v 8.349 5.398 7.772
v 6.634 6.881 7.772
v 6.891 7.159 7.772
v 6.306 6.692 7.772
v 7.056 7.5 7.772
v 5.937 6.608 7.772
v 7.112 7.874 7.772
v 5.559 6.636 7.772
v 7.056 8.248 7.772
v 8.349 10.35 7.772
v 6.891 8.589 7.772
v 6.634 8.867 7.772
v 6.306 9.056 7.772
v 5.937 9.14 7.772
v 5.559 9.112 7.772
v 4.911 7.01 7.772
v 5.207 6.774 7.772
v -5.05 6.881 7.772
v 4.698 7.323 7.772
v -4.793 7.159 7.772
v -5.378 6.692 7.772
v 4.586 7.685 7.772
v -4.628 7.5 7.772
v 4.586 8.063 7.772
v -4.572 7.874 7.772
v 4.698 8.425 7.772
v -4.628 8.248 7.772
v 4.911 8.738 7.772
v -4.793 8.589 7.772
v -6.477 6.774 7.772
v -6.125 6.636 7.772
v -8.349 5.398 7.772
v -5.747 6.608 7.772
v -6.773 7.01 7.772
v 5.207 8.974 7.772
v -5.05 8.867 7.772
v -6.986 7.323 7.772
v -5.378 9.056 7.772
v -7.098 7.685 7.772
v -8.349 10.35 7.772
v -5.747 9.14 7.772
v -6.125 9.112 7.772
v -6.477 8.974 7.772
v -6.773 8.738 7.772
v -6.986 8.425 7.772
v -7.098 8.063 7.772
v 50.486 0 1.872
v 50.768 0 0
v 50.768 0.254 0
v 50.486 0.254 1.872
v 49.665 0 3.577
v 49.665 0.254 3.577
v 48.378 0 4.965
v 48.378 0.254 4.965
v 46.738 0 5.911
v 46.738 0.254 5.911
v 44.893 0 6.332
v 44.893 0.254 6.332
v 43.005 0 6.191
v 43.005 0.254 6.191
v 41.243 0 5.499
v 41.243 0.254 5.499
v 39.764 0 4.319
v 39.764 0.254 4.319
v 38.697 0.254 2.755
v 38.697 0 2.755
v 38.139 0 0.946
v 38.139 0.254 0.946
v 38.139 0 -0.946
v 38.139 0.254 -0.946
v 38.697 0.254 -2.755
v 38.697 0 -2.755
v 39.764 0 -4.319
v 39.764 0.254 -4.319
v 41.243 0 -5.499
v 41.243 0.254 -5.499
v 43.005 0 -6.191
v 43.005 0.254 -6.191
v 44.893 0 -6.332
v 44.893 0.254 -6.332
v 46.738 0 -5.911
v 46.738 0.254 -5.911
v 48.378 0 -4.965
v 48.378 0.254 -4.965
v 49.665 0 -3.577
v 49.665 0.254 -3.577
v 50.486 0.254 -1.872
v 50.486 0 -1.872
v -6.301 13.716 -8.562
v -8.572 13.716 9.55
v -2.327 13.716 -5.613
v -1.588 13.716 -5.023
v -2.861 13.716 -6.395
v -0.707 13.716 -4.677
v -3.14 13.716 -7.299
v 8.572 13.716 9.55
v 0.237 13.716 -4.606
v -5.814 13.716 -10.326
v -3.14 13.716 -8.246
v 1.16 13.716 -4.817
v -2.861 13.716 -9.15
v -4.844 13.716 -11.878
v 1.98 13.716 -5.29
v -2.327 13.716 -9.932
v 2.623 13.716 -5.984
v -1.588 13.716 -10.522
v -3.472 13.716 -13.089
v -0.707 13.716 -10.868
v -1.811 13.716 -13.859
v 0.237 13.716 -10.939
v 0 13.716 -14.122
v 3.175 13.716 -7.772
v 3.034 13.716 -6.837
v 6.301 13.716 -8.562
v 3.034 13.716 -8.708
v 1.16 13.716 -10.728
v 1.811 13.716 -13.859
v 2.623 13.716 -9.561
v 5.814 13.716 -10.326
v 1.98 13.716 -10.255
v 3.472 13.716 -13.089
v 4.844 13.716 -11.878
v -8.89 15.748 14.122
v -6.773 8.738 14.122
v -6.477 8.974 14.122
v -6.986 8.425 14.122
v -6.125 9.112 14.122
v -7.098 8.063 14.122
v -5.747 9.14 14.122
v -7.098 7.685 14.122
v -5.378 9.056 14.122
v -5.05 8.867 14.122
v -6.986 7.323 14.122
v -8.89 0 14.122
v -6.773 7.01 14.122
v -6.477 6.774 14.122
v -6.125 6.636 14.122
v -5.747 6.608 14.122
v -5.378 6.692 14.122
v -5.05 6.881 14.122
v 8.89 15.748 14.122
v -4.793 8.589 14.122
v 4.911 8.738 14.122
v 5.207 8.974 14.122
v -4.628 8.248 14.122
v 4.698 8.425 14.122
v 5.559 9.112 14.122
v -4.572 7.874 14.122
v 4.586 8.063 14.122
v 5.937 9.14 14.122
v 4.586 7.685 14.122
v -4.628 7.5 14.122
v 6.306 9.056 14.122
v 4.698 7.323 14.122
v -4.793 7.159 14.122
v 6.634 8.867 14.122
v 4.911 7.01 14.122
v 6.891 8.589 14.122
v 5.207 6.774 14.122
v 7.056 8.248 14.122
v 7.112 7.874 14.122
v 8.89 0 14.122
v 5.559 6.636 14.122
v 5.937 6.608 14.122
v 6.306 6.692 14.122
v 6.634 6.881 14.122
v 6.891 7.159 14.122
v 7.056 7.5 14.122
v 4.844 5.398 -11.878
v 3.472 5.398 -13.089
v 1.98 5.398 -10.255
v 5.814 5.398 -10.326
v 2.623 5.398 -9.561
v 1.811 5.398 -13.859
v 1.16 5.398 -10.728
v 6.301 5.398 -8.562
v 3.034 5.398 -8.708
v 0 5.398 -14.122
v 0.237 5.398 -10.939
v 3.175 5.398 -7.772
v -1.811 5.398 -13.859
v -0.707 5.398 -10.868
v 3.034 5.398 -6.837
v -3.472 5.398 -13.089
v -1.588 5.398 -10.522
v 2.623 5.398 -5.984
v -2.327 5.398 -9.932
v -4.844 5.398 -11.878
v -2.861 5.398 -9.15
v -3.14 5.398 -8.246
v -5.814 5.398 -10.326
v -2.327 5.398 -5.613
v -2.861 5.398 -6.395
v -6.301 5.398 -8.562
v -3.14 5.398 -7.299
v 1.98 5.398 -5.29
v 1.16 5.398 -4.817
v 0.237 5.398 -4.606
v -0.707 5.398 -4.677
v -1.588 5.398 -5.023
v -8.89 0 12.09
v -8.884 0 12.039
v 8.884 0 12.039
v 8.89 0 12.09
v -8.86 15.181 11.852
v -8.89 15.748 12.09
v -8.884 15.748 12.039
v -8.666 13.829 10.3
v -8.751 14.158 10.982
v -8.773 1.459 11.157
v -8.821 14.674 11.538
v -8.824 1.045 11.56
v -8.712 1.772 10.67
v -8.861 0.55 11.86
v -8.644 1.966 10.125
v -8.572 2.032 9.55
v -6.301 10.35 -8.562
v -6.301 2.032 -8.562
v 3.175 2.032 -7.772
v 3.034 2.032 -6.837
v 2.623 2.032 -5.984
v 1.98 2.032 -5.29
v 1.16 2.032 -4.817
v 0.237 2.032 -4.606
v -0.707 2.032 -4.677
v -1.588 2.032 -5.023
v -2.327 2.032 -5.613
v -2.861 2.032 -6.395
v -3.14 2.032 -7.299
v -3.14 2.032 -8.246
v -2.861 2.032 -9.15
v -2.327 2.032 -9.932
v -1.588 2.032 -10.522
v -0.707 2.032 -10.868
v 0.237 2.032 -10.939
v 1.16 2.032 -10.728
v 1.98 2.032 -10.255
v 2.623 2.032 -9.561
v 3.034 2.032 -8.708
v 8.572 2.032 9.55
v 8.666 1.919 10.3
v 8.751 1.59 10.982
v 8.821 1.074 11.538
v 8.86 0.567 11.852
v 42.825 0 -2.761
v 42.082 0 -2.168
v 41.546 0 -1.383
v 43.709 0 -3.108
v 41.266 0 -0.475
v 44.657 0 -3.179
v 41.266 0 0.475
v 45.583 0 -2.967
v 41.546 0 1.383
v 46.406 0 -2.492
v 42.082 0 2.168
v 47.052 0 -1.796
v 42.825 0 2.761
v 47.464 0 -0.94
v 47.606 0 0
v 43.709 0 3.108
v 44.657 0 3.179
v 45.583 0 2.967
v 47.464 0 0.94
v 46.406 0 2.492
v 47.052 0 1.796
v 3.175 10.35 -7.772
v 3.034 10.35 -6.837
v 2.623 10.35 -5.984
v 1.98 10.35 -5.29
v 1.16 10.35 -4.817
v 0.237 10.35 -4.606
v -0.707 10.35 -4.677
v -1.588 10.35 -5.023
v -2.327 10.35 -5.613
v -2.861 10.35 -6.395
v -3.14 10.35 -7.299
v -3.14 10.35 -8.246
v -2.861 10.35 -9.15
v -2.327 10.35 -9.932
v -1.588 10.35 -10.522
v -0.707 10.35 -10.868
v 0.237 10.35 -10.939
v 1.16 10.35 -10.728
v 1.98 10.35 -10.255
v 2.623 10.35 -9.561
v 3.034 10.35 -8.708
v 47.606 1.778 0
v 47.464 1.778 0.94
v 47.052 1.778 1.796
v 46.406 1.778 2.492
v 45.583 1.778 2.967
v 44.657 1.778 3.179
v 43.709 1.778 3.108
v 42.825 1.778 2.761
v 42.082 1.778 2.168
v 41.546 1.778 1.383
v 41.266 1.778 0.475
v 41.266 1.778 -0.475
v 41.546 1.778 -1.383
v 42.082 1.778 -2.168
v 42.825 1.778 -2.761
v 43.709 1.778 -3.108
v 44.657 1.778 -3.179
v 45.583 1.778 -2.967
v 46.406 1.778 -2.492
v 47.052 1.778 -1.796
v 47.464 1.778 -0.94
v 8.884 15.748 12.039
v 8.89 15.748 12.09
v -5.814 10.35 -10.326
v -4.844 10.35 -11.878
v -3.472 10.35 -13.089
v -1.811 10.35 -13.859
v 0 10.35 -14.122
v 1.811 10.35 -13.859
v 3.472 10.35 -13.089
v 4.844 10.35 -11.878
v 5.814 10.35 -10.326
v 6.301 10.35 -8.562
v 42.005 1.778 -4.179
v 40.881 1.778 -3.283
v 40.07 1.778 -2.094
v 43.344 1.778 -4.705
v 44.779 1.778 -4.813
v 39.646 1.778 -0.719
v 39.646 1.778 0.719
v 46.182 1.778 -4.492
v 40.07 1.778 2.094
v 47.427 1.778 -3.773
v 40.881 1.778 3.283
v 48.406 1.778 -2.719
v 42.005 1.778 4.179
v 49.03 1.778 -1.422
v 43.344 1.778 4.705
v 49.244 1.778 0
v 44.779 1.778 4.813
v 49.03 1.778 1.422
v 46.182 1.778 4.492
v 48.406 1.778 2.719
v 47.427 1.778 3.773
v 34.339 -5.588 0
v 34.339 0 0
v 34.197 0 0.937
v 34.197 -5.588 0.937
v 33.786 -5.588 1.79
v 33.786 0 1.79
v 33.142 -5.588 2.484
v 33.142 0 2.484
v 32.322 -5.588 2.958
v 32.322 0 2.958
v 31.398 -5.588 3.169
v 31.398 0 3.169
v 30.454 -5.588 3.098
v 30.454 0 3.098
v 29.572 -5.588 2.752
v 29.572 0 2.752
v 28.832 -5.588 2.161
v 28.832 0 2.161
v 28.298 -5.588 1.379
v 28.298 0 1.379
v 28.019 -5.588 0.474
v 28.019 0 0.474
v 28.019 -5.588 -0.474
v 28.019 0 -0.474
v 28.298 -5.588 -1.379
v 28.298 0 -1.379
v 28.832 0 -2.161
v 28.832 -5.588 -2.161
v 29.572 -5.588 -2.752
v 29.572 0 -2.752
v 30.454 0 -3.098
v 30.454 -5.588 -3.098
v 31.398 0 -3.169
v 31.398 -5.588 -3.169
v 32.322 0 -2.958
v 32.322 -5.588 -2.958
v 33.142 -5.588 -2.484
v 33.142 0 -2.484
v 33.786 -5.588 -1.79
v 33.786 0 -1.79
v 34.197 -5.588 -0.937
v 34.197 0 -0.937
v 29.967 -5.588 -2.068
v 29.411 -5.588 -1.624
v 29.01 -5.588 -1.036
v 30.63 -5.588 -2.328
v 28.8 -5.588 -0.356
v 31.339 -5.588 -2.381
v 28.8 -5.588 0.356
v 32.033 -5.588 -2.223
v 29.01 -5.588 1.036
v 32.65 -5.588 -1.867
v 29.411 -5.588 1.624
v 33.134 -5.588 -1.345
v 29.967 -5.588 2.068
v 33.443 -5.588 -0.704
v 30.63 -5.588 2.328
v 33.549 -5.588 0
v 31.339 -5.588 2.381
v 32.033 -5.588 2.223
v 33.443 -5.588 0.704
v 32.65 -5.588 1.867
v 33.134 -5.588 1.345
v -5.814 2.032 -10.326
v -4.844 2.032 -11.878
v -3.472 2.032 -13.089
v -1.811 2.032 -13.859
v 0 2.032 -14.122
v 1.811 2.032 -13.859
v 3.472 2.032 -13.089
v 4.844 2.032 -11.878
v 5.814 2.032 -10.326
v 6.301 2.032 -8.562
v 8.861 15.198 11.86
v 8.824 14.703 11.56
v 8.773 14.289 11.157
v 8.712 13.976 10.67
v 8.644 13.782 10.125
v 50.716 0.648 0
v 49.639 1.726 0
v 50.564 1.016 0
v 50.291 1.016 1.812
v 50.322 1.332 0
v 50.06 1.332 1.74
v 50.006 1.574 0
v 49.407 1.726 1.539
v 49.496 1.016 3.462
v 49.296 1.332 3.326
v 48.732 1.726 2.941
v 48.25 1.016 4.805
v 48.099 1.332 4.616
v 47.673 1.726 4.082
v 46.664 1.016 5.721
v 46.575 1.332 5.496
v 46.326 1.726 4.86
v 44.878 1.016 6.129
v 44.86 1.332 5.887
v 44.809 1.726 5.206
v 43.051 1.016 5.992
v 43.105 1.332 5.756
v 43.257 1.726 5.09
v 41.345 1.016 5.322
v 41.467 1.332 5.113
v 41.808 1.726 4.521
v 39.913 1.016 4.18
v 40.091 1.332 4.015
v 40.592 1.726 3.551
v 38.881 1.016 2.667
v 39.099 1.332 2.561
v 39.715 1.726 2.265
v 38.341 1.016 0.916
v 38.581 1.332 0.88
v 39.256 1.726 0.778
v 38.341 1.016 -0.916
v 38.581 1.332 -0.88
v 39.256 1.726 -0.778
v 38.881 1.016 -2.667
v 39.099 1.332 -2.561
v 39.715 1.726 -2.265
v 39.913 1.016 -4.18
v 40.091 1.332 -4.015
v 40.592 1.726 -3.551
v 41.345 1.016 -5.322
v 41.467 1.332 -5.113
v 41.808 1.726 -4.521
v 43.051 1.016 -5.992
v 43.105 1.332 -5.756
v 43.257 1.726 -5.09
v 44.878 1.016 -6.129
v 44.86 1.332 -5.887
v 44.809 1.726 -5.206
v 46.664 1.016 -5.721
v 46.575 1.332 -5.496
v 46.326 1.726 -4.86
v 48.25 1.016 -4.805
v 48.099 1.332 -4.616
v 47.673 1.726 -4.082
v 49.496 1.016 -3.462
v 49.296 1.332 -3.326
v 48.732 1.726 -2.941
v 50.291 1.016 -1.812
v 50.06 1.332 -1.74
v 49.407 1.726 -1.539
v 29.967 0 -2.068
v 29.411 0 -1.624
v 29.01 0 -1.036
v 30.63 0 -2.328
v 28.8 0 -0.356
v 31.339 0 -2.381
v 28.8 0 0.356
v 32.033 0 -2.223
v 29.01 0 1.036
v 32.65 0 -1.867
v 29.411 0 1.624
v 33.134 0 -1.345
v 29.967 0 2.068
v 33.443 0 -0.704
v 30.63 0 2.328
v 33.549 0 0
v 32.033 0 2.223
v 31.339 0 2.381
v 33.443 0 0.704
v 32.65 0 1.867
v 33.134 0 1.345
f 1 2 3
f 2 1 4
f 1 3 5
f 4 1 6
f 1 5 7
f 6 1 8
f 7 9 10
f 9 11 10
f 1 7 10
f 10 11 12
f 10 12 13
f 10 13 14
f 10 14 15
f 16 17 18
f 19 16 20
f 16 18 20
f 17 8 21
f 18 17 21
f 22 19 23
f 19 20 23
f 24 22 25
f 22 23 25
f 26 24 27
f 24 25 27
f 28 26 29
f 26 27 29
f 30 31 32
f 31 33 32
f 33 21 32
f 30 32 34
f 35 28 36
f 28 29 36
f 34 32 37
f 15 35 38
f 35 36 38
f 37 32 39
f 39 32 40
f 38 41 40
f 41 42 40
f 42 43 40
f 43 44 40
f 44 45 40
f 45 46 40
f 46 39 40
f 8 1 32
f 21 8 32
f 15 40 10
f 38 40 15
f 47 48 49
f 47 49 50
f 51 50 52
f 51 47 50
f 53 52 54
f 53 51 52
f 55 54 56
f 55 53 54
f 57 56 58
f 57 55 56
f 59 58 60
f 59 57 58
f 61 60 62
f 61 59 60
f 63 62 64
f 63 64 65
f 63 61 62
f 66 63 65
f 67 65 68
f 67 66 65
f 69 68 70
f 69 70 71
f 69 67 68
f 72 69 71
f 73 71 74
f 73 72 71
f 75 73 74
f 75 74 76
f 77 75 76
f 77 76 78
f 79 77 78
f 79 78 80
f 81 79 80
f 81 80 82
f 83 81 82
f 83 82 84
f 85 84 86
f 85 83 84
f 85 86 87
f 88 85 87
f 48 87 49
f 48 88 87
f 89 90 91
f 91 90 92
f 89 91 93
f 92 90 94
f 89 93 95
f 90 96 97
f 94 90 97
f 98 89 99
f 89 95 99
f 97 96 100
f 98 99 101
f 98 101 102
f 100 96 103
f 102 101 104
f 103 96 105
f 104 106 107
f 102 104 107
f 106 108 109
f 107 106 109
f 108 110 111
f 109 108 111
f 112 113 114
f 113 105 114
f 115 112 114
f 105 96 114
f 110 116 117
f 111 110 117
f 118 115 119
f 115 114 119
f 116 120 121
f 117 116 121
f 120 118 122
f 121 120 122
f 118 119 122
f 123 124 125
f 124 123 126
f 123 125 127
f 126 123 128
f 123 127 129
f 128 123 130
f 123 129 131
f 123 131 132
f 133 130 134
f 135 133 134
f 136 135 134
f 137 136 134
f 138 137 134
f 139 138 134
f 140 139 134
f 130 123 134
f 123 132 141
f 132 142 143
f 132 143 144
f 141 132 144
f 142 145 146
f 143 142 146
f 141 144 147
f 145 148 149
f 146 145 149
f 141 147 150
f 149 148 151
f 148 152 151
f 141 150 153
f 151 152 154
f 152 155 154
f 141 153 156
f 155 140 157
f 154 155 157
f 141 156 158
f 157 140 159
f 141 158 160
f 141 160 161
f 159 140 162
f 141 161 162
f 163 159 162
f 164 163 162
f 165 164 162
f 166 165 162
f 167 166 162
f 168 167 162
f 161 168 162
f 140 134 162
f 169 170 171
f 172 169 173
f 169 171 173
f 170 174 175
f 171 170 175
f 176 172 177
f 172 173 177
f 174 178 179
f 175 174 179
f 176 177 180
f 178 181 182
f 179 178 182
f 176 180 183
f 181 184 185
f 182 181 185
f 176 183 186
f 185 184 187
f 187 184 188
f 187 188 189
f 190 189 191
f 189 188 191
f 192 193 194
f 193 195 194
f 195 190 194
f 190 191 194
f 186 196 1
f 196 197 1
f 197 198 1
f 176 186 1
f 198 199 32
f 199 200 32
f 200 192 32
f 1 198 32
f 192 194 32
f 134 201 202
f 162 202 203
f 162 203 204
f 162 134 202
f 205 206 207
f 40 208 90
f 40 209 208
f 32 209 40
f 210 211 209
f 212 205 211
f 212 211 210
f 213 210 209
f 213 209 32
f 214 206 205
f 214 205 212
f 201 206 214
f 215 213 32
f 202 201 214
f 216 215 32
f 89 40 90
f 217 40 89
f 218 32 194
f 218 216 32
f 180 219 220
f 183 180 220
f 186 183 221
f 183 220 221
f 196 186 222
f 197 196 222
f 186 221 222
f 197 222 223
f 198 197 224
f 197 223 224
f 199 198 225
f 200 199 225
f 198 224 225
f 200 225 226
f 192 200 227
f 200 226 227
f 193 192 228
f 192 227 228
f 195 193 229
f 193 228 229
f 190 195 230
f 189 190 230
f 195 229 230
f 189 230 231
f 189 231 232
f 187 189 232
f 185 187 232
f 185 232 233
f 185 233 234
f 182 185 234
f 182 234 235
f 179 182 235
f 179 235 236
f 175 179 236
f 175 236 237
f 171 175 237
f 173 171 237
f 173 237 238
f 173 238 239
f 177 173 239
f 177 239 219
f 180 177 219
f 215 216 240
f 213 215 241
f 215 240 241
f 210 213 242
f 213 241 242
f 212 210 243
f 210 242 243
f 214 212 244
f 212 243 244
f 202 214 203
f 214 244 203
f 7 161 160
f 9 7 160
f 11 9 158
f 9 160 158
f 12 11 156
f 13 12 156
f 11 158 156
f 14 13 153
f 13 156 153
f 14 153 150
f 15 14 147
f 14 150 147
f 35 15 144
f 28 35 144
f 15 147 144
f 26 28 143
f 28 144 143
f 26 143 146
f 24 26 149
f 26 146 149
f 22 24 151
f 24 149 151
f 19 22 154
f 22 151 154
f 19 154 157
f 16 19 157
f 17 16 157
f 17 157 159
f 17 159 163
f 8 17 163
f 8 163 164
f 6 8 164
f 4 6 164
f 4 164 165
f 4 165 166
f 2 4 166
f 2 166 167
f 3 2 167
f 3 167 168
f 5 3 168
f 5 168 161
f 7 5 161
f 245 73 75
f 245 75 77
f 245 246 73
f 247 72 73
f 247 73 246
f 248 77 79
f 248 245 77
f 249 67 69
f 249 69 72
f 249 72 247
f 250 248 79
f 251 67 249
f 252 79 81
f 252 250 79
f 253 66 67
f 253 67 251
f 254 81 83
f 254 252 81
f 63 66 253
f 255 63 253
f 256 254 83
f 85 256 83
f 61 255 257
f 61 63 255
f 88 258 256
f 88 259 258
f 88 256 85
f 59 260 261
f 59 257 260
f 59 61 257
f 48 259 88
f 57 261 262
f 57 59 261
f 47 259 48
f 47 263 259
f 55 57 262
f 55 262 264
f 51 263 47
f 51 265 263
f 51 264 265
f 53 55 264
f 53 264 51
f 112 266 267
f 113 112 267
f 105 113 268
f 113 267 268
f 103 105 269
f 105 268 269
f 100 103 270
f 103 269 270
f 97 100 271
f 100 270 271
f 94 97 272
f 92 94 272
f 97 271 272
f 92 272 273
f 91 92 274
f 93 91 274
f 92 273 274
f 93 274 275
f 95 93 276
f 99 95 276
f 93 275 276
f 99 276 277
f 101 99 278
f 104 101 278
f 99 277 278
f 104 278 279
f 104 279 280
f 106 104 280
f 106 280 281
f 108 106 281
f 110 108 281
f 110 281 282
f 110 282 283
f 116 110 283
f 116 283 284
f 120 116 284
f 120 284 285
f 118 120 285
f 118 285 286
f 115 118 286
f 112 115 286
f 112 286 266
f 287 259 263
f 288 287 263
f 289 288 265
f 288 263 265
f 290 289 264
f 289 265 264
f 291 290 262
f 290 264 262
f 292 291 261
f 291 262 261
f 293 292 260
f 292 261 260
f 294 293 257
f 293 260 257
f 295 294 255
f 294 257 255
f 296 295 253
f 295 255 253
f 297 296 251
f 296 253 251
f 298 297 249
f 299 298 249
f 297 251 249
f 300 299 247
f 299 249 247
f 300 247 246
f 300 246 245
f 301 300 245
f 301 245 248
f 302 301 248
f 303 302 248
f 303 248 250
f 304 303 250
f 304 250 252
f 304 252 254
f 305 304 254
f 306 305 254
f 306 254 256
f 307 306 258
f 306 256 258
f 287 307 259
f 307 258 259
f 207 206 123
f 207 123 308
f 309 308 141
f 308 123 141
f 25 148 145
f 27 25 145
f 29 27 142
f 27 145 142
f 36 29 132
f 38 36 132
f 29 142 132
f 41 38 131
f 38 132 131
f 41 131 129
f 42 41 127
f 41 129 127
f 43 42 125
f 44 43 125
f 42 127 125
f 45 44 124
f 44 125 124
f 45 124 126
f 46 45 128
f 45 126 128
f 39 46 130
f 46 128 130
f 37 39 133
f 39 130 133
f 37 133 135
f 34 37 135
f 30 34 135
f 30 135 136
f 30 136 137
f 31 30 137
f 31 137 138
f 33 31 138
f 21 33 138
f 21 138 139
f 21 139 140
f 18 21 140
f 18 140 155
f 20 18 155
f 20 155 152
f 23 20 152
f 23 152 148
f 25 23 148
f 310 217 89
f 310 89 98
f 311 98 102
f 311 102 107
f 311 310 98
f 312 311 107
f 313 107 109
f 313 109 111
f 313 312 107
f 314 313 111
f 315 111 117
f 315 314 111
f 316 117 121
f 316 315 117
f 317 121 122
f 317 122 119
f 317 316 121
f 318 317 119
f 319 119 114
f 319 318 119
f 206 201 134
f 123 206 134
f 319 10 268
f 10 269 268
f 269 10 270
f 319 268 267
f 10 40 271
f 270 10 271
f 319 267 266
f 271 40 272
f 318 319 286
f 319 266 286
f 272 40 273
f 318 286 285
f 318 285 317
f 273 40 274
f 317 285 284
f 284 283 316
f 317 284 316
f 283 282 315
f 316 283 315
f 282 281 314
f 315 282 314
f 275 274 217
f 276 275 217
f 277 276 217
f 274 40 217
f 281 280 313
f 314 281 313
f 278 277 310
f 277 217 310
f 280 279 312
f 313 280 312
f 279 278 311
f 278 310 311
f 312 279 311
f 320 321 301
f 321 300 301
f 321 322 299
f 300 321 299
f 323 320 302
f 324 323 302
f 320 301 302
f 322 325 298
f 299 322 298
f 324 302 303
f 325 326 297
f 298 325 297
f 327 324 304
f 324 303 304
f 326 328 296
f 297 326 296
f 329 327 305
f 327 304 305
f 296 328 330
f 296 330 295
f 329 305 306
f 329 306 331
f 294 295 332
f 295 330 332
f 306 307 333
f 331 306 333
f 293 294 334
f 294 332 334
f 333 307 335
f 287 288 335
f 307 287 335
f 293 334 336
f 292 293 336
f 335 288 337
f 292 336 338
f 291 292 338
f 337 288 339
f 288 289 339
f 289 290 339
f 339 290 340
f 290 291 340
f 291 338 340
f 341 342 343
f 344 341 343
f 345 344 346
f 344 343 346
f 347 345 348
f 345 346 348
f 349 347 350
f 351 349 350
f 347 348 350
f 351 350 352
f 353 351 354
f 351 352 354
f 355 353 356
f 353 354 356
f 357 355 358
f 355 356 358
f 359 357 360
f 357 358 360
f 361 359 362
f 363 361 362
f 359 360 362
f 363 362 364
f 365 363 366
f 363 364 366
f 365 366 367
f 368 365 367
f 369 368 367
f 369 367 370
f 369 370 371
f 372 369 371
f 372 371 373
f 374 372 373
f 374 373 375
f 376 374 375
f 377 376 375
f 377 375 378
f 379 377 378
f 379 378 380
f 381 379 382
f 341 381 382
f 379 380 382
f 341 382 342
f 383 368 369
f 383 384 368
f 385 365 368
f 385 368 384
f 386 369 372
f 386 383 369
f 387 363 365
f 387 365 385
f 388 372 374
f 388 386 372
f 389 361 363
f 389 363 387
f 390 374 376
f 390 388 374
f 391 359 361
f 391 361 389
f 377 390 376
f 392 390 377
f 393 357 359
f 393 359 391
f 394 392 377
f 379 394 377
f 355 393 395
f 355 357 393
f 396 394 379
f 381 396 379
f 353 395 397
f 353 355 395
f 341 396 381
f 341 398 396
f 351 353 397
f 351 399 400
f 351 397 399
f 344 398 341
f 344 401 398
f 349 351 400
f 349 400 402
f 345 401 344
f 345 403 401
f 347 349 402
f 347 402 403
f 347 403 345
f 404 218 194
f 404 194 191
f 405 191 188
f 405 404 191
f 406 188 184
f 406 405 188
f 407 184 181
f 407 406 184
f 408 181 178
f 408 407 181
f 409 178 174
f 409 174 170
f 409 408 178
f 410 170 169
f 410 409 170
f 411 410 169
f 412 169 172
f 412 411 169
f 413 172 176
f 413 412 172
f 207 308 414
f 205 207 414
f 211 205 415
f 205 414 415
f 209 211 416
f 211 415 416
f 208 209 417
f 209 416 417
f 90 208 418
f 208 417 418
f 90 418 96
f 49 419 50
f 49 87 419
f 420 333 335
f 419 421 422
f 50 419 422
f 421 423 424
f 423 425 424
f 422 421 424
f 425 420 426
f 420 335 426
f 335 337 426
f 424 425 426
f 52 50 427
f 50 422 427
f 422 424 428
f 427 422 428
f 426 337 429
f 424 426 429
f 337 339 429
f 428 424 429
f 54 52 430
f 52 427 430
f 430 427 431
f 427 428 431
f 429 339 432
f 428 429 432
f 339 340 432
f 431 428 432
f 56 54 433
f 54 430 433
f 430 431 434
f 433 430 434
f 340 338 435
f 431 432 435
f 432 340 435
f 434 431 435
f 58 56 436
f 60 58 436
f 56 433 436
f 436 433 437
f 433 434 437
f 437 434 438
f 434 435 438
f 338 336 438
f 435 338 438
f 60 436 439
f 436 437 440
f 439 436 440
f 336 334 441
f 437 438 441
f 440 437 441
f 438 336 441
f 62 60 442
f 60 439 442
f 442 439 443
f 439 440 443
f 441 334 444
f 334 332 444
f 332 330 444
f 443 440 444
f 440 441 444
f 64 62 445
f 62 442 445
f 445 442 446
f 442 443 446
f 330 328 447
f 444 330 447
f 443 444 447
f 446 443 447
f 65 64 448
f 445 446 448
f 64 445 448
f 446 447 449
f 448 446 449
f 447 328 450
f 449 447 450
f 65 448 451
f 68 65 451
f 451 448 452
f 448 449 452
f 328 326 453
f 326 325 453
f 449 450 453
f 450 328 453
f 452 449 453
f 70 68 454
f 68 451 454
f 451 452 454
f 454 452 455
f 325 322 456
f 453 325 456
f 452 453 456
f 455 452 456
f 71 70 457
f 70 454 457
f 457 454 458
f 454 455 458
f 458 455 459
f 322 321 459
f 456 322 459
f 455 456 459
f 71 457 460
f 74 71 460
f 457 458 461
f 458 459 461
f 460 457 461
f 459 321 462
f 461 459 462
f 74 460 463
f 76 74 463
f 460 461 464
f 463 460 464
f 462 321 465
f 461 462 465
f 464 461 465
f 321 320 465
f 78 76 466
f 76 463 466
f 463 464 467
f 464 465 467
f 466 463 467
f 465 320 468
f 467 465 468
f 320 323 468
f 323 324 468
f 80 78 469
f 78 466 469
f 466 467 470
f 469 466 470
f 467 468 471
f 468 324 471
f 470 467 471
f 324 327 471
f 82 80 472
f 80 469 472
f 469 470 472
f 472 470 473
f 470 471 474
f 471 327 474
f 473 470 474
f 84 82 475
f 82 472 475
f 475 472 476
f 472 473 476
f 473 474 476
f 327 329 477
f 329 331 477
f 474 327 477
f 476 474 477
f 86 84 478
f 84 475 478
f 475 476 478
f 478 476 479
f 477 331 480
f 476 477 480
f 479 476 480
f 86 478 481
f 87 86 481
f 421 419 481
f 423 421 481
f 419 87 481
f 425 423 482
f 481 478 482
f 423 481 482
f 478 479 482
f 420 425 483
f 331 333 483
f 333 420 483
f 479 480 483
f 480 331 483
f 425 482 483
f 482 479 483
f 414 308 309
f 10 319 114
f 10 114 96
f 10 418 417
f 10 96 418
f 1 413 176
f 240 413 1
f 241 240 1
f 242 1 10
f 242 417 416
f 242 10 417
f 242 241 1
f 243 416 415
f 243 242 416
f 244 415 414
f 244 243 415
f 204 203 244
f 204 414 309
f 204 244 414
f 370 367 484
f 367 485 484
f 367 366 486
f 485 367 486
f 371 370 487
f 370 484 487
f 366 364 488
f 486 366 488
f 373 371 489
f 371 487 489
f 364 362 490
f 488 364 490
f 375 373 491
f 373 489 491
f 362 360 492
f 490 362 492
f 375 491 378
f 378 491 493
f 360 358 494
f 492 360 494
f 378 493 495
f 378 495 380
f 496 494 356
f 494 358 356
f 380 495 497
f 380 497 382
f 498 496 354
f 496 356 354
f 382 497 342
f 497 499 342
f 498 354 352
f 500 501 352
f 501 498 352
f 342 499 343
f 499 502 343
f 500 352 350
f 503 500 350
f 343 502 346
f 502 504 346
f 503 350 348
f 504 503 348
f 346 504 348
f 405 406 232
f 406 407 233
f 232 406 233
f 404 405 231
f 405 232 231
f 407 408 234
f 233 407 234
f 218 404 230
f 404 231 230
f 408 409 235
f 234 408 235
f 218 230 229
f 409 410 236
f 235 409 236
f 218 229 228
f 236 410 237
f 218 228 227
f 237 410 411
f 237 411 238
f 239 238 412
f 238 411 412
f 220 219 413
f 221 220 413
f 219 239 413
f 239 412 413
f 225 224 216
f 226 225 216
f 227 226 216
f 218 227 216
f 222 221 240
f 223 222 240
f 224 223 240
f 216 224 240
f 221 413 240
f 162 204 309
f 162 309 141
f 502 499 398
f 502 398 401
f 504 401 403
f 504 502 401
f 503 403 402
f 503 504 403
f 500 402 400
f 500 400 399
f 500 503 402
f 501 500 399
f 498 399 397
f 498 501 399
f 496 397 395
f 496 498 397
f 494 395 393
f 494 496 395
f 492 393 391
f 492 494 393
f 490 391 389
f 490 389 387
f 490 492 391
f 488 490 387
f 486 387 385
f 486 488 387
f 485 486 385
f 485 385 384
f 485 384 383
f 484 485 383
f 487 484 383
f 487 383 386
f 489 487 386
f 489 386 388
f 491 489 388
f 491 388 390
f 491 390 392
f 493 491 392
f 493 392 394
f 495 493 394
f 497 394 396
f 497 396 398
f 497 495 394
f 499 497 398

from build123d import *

# Parameters (mm, degrees)
F0_W      = 17.78
F0_H      = 2.032
F0_R      = 3.175
F1_DEPTH  = 15.748
F3_DEPTH  = 17.781
F5_DEPTH  = 17.781
F6_R      = 1.27
F7_DEPTH  = 25.4
F8_R      = 3.17754
F8_R_2    = 2.3876
F9_DEPTH  = 5.588
F10_R     = 6.35
F10_R_2   = 3.1877
F11_DEPTH = 1.778
F12_R     = 1.524


with BuildPart() as f1:
    # F0 (on Front) → F1 (new body)
    with BuildSketch(Plane.XZ):
        with Locations((0, 13.1064)):
            Rectangle(F0_W, F0_H)
        with BuildLine():
            Line((6.300674, -8.562343), (8.89, 12.0904))
            Line((8.89, 12.0904), (-8.89, 12.0904))
            Line((-8.89, 12.0904), (-6.300674, -8.562343))
            ThreePointArc((-6.300674, -8.562343), (0, -14.1224), (6.300674, -8.562343))
        make_face()
        with Locations((0, -7.7724)):
            Circle(F0_R, mode=Mode.SUBTRACT)
    extrude(amount=-F1_DEPTH)

    # F2 (on face) → F3 (cut, through all)
    with BuildSketch(Plane(origin=(-8.89, 0, 0), x_dir=(0, -1, 0), z_dir=(-1, 0, 0))):
        Polygon((-5.3975, 7.7724), (-10.3505, 7.7724), (-10.3505, -8.7884), (-10.3505, -15.734874), (-5.3975, -15.734874), (-5.3975, -8.7884), align=None)
    extrude(amount=-F3_DEPTH, mode=Mode.SUBTRACT)

    # F4 (on face) → F5 (cut, through all)
    with BuildSketch(Plane.YZ.offset(8.89)):
        with BuildLine():
            ThreePointArc((16.256, 12.0904), (14.459949, 11.346451), (13.716, 9.5504))
            Line((13.716, 9.5504), (13.716, -23.945976))
            Line((13.716, -23.945976), (22.954069, -23.945976))
            Line((22.954069, -23.945976), (22.954069, 12.0904))
            Line((22.954069, 12.0904), (16.256, 12.0904))
        make_face()
        with BuildLine():
            Line((-2.601736, -59.50403), (2.032, -59.50403))
            Line((2.032, -59.50403), (2.032, 9.5504))
            ThreePointArc((2.032, 9.5504), (1.288051, 11.346451), (-0.508, 12.0904))
            Line((-0.508, 12.0904), (-2.601736, 12.0904))
            Line((-2.601736, 12.0904), (-2.601736, -59.50403))
        make_face()
    extrude(amount=-F5_DEPTH, mode=Mode.SUBTRACT)

    # F6 (on face) → F7 (cut)
    with BuildSketch(Plane.XY.offset(14.1224)):
        with Locations((5.842, 7.874)):
            Circle(F6_R)
        with Locations((-5.842, 7.874)):
            Circle(F6_R)
    extrude(amount=-F7_DEPTH, mode=Mode.SUBTRACT)


with BuildPart() as f9:
    # F8 (on Front) → F9 (new body)
    with BuildSketch(Plane.XZ):
        with Locations((31.161029, 0)):
            Circle(F8_R)
        with Locations((31.161029, 0)):
            Circle(F8_R_2, mode=Mode.SUBTRACT)
    extrude(amount=F9_DEPTH)


with BuildPart() as f11:
    # F10 (on Front) → F11 (new body)
    with BuildSketch(Plane.XZ):
        with Locations((44.41838, 0)):
            Circle(F10_R)
        with Locations((44.41838, 0)):
            Circle(F10_R_2, mode=Mode.SUBTRACT)
    extrude(amount=-F11_DEPTH)

    # F12
    f12_edges = [f11.edges().sort_by_distance(p)[0] for p in [
        (38.06838, 1.778, 0),
    ]]
    fillet(f12_edges, radius=F12_R)


solid = Compound([f1.part, f9.part, f11.part])
